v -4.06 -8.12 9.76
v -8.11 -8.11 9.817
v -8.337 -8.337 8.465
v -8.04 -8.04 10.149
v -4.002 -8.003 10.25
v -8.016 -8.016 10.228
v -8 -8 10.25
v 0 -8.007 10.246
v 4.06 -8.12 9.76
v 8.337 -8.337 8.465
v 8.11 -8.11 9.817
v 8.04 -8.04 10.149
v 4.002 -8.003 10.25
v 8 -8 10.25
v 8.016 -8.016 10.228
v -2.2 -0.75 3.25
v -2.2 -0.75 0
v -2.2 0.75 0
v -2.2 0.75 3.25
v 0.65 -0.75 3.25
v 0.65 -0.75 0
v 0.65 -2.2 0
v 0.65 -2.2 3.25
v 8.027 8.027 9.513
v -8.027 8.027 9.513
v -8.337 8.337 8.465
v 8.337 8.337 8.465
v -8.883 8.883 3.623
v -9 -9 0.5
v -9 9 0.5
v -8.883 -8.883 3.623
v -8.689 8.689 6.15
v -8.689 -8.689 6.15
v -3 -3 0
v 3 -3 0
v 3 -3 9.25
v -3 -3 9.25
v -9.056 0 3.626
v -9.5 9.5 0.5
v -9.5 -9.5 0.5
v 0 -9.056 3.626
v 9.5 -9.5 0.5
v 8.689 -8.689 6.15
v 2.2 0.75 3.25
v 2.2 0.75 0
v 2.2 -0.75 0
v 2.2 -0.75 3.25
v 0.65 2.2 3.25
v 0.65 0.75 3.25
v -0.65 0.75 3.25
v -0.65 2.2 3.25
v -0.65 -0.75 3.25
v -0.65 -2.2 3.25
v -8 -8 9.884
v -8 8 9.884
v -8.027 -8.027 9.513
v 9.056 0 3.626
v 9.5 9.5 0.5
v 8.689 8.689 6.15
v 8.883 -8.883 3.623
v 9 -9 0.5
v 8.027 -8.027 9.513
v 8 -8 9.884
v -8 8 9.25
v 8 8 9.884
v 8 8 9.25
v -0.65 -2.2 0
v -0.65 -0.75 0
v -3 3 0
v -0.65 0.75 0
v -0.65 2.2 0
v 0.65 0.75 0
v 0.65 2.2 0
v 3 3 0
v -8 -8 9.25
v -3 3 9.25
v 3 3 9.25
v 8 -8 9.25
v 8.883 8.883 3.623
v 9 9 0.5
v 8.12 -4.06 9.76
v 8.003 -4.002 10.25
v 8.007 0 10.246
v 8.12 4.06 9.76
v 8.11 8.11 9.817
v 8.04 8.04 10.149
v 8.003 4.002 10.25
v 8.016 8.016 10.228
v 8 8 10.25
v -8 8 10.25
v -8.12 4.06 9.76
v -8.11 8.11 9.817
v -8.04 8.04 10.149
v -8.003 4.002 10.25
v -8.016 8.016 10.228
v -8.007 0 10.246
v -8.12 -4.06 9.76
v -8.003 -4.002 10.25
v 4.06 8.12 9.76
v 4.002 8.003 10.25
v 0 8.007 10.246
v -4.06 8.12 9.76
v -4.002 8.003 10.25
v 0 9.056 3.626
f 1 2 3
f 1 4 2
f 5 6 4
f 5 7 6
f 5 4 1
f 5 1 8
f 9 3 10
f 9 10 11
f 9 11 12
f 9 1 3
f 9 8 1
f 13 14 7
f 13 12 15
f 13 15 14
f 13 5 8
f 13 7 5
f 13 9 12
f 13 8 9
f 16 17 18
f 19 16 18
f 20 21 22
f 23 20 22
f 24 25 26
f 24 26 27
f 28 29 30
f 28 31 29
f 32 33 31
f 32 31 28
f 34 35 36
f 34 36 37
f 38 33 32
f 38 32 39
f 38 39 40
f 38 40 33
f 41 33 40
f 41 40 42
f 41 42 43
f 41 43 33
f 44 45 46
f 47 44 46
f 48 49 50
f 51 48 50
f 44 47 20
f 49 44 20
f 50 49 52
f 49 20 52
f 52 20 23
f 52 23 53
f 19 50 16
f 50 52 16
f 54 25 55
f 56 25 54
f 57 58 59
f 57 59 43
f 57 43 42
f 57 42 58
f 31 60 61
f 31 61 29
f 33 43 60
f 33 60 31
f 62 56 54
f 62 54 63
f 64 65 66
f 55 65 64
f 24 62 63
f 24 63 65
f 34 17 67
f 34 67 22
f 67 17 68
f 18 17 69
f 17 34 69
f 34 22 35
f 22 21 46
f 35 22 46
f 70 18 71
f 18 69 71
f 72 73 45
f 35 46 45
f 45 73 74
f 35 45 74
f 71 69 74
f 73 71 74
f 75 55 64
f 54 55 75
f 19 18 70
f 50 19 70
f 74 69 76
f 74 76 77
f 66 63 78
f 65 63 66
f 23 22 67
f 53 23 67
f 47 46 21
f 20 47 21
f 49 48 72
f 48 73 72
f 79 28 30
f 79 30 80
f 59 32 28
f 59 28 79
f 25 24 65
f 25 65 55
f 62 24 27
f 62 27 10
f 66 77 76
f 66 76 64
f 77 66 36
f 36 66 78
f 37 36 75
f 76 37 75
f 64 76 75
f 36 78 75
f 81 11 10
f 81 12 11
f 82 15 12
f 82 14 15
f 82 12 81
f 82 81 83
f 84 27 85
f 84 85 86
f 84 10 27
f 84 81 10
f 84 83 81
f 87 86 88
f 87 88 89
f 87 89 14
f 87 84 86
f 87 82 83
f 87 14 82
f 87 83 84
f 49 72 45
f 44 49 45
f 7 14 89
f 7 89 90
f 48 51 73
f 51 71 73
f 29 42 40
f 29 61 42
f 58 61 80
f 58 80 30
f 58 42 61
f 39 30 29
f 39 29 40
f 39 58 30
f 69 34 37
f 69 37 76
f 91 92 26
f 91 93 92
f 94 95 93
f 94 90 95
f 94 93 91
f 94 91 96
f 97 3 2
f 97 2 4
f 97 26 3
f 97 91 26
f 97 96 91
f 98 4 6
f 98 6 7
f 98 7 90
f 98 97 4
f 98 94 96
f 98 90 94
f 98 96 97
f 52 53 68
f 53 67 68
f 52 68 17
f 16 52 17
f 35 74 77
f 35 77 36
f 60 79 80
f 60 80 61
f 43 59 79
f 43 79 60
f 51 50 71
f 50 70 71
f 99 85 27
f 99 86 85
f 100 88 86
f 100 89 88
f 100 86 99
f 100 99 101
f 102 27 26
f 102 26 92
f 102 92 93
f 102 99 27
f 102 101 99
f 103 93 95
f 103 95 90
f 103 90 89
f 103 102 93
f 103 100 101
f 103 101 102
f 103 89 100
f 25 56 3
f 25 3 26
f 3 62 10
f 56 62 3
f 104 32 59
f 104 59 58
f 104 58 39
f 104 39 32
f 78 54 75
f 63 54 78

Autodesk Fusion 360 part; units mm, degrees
sketch "Boceto1" plane through (0, 0, 0) normal (0, 0, 1) x (1, 0, 0)
  line L0 (3, -3) -> (-3, -3)
  line L1 (-3, -3) -> (-3, 3)
  line L2 (-3, 3) -> (3, 3)
  line L3 (3, 3) -> (3, -3)
  line L4 (3, -3) -> (-3, 3) construction
  line L5 (-3, -3) -> (3, 3) construction
  line L6 (-2.1, 0) -> (2.1, 0) construction
  line L7 (0, -2.1) -> (0, 2.1) construction
  line L8 (-2.1, -0.65) -> (-2.1, 0.65) construction
  line L9 (-2.1, 0.65) -> (-0.55, 0.65) construction
  line L10 (-0.55, 0.65) -> (-0.55, 2.1) construction
  line L11 (-0.55, 2.1) -> (0.55, 2.1) construction
  line L12 (0.55, 2.1) -> (0.55, 0.65) construction
  line L13 (0.55, 0.65) -> (2.1, 0.65) construction
  line L14 (2.1, 0.65) -> (2.1, -0.65) construction
  line L15 (2.1, -0.65) -> (0.55, -0.65) construction
  line L16 (0.55, -0.65) -> (0.55, -2.1) construction
  line L17 (0.55, -2.1) -> (-0.55, -2.1) construction
  line L18 (-0.55, -2.1) -> (-0.55, -0.65) construction
  line L19 (-0.55, -0.65) -> (-2.1, -0.65) construction
  line L20 (-2.2, -0.75) -> (-2.2, 0.75)
  line L21 (-2.2, 0.75) -> (-0.65, 0.75)
  line L22 (-0.65, 0.75) -> (-0.65, 2.2)
  line L23 (-0.65, 2.2) -> (0.65, 2.2)
  line L24 (0.65, 2.2) -> (0.65, 0.75)
  line L25 (0.65, 0.75) -> (2.2, 0.75)
  line L26 (2.2, 0.75) -> (2.2, -0.75)
  line L27 (2.2, -0.75) -> (0.65, -0.75)
  line L28 (0.65, -0.75) -> (0.65, -2.2)
  line L29 (0.65, -2.2) -> (-0.65, -2.2)
  line L30 (-0.65, -2.2) -> (-0.65, -0.75)
  line L31 (-0.65, -0.75) -> (-2.2, -0.75)
  dimension "d2" = 6
  dimension "d3" = 6
  dimension "d4" = 4.2
  dimension "d5" = 1.1
  dimension "d6" = 1.3
  dimension "d7" = -0.1
extrude "Extruir1" add sketch "Boceto1" along normal blind 3.25 makes body 1
sketch "Boceto2" plane through (0, 0, 3.25) normal (0, 0, 1) x (-1, 0, 0)
  line L0 (0.65, 2.2) -> (0.65, 0.75)
  line L1 (0.65, 0.75) -> (2.2, 0.75)
  line L2 (2.2, 0.75) -> (2.2, -0.75)
  line L3 (2.2, -0.75) -> (0.65, -0.75)
  line L4 (0.65, -0.75) -> (0.65, -2.2)
  line L5 (0.65, -2.2) -> (-0.65, -2.2)
  line L6 (-0.65, -2.2) -> (-0.65, -0.75)
  line L7 (-0.65, -0.75) -> (-2.2, -0.75)
  line L8 (-2.2, -0.75) -> (-2.2, 0.75)
  line L9 (-2.2, 0.75) -> (-0.65, 0.75)
  line L10 (-0.65, 0.75) -> (-0.65, 2.2)
  line L11 (-0.65, 2.2) -> (0.65, 2.2)
  line L12 (-3, -3) -> (3, -3)
  line L13 (3, -3) -> (3, 3)
  line L14 (3, 3) -> (-3, 3)
  line L15 (-3, 3) -> (-3, -3)
  line L16 (3, -3) -> (-3, -3)
  line L17 (-3, -3) -> (-3, 3)
  line L18 (-3, 3) -> (3, 3)
  line L19 (3, 3) -> (3, -3)
extrude "Extruir2" add sketch "Boceto2" along normal blind 6 contours L0 L1 L2 L3 L4 L5 L6 L7 L8 L9 L10 L11 | L12 L13 L14 L15 L16 L17 L18 L19 bodies 1
ref_plane "PlanoDeObra3" through (0, 0, 10.25) normal (0, 0, 1) x (1, 0, 0)
sketch "Boceto5" plane through (0, 0, 10.25) normal (0, 0, 1) x (-1, 0, 0)
  line L0 (3, 3) -> (-3, 3)
  line L1 (-3, 3) -> (-3, -3)
  line L2 (-3, -3) -> (3, -3)
  line L3 (3, -3) -> (3, 3)
  line L4 (-8, -8) -> (8, -8)
  line L5 (8, -8) -> (8, 8)
  line L6 (8, 8) -> (-8, 8)
  line L7 (-8, 8) -> (-8, -8)
  line L8 (-8, -8) -> (8, 8) construction
  line L9 (8, -8) -> (-8, 8) construction
  line L10 (-7.5, -7.5) -> (7.5, -7.5)
  line L11 (7.5, -7.5) -> (7.5, 7.5)
  line L12 (7.5, 7.5) -> (-7.5, 7.5)
  line L13 (-7.5, 7.5) -> (-7.5, -7.5)
  line L14 (-7.5, -7.5) -> (7.5, 7.5) construction
  line L15 (7.5, -7.5) -> (-7.5, 7.5) construction
  dimension "d17" = 16
  dimension "d18" = 15
ref_plane "PlanoDeObra1" through (0, 0, 0.5) normal (0, 0, 1) x (1, 0, 0)
sketch "Boceto9" plane through (0, 0, 0.5) normal (0, 0, 1) x (1, 0, 0)
  line L0 (9.5, 9.5) -> (-9.5, 9.5)
  line L1 (-9.5, 9.5) -> (-9.5, -9.5)
  line L2 (-9.5, -9.5) -> (9.5, -9.5)
  line L3 (9.5, -9.5) -> (9.5, 9.5)
  line L4 (9.5, 9.5) -> (-9.5, -9.5) construction
  line L5 (-9.5, 9.5) -> (9.5, -9.5) construction
  line L6 (9, 9) -> (-9, 9)
  line L7 (-9, 9) -> (-9, -9)
  line L8 (-9, -9) -> (9, -9)
  line L9 (9, -9) -> (9, 9)
  line L10 (9, 9) -> (-9, -9) construction
  line L11 (-9, 9) -> (9, -9) construction
  line L12 (3, -3) -> (3, 3)
  line L13 (3, 3) -> (-3, 3)
  line L14 (-3, 3) -> (-3, -3)
  line L15 (-3, -3) -> (3, -3)
  dimension "d22" = 0.5
  dimension "d23" = 19
loft "Solevación1" add profiles "Boceto9", "Boceto5", "Boceto9" section 1 contours L0 L1 L2 L3 section 2 contours L4 L5 L6 L7 section 3 contours L6 L7 L8 L9 separate body makes body 2 at (-3.0651, -9.1953, 2.6509)
extrude "Extruir4" add sketch "Boceto5" against normal blind 1 contours L0 L1 L2 L3 | L4 L5 L6 L7 | L10 L11 L12 L13 bodies 1 2
